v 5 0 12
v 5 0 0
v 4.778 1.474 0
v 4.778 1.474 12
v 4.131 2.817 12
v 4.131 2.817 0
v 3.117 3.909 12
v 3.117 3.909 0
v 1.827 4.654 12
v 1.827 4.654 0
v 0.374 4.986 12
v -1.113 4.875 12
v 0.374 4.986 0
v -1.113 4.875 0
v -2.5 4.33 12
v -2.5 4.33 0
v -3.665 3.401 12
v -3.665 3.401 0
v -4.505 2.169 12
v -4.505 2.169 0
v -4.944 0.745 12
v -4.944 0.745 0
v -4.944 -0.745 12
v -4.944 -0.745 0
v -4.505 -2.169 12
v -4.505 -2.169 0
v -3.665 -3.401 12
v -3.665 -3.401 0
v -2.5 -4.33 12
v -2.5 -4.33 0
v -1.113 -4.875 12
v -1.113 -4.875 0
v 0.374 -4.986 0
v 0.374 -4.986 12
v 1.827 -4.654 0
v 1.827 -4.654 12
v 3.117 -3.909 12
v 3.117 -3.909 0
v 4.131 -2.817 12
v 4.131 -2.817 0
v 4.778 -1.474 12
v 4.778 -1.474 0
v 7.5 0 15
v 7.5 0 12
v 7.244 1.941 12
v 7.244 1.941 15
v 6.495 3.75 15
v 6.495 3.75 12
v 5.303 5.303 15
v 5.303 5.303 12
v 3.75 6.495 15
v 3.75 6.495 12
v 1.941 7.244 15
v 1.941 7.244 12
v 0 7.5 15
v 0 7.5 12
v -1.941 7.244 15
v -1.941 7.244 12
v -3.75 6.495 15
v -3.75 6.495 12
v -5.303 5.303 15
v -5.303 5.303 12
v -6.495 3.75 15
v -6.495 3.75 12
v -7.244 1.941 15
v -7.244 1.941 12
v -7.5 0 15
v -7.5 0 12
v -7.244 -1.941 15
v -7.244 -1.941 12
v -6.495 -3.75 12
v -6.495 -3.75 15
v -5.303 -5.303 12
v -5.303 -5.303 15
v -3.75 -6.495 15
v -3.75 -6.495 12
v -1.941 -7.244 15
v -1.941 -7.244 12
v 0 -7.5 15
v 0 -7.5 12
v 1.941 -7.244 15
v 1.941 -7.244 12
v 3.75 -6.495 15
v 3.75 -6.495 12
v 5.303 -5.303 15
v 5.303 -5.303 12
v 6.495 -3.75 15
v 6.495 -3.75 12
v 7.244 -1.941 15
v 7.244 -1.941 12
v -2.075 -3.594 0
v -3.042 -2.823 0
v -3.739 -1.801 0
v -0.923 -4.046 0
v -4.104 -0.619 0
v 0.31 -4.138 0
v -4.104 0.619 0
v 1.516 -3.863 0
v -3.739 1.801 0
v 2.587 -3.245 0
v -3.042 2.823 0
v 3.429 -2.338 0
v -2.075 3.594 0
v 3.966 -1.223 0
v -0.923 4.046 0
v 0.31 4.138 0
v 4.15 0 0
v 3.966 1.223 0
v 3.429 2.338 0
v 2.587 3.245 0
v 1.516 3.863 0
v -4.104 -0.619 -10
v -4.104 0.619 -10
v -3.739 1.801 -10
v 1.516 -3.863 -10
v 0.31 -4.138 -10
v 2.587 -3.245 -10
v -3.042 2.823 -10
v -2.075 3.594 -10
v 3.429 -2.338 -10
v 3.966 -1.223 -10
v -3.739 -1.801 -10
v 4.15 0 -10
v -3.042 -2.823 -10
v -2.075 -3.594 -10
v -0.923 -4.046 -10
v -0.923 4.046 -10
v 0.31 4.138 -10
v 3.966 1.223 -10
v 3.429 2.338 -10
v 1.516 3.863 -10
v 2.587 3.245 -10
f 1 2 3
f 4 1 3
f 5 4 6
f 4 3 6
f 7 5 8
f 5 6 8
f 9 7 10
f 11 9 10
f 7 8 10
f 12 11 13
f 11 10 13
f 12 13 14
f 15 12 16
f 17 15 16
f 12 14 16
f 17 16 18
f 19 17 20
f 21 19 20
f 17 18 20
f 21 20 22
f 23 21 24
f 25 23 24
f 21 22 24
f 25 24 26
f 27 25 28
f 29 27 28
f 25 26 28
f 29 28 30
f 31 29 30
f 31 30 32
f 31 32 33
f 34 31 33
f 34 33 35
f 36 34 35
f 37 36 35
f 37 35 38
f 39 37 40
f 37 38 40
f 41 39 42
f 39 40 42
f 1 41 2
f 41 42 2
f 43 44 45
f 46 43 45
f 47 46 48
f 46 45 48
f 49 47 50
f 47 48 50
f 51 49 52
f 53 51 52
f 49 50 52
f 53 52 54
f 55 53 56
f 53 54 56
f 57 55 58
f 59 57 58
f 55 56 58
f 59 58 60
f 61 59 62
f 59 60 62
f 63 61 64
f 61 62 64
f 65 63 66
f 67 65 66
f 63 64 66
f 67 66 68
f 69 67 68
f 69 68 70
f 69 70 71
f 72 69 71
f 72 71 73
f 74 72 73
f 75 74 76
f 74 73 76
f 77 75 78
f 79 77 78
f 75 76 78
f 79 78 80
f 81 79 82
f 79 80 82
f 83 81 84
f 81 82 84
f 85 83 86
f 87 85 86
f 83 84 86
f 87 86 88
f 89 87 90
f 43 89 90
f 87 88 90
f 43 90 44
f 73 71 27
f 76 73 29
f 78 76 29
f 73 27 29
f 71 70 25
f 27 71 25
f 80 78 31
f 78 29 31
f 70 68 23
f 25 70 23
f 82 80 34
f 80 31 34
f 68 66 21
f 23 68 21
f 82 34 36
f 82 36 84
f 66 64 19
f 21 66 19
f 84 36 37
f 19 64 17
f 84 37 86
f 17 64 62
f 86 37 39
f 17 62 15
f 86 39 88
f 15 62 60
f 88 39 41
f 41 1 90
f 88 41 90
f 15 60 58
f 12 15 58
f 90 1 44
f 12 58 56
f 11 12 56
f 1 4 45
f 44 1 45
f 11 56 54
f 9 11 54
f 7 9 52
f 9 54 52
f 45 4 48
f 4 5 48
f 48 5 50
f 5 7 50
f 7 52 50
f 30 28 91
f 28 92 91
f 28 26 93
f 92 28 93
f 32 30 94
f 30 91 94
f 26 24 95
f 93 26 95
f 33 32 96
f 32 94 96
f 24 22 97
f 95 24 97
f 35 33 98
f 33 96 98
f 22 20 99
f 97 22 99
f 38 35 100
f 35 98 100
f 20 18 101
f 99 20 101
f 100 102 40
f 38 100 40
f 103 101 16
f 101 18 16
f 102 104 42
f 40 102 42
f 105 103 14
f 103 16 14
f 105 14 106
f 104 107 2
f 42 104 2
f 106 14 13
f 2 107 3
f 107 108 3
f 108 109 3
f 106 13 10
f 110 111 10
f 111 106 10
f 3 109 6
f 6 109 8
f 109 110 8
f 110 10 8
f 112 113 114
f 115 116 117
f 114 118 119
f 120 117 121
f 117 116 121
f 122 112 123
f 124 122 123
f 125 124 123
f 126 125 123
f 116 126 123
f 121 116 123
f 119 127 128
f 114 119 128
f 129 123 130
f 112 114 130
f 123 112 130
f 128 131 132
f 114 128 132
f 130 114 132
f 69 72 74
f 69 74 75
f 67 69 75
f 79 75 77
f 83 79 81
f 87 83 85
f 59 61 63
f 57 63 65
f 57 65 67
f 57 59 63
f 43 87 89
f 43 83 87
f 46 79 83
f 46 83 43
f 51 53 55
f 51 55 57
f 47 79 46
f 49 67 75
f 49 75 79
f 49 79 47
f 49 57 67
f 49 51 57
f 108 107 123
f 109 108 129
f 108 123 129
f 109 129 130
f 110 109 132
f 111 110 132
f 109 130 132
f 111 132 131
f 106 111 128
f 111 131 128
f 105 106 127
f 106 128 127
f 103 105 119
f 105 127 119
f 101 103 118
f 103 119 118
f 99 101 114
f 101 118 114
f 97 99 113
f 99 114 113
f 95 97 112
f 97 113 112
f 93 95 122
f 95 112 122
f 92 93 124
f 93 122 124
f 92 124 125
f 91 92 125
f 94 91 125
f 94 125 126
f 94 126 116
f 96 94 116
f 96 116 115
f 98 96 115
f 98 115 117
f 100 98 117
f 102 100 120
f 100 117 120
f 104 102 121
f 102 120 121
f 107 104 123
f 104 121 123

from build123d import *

# Parameters (mm, degrees)
M10_START                                     = -10
SKETCH1_R                                     = 4.15
M10_ROD_ENGAGEMENT_THREAD_CORE_REPRESEN_DEPTH = 10
SKETCH2_R                                     = 5
FLOATING_SHOULDER_THROUGH_BRIDGE_DEPTH        = 12
CAPTIVE_START                                 = 12
SKETCH3_R                                     = 7.5
CAPTIVE_THRUST_HEAD_DEPTH                     = 3


with BuildPart() as part:
    # Sketch1 → M10 rod engagement, thread core represented (new body)
    with BuildSketch(Plane.XY.offset(M10_START)):
        Circle(SKETCH1_R)
    extrude(amount=M10_ROD_ENGAGEMENT_THREAD_CORE_REPRESEN_DEPTH)

    # Sketch2 → Floating shoulder through bridge (add)
    with BuildSketch(Plane.XY):
        Circle(SKETCH2_R)
    extrude(amount=FLOATING_SHOULDER_THROUGH_BRIDGE_DEPTH)

    # Sketch3 → Captive thrust head (add)
    with BuildSketch(Plane.XY.offset(CAPTIVE_START)):
        Circle(SKETCH3_R)
    extrude(amount=CAPTIVE_THRUST_HEAD_DEPTH)


solid = part.part
